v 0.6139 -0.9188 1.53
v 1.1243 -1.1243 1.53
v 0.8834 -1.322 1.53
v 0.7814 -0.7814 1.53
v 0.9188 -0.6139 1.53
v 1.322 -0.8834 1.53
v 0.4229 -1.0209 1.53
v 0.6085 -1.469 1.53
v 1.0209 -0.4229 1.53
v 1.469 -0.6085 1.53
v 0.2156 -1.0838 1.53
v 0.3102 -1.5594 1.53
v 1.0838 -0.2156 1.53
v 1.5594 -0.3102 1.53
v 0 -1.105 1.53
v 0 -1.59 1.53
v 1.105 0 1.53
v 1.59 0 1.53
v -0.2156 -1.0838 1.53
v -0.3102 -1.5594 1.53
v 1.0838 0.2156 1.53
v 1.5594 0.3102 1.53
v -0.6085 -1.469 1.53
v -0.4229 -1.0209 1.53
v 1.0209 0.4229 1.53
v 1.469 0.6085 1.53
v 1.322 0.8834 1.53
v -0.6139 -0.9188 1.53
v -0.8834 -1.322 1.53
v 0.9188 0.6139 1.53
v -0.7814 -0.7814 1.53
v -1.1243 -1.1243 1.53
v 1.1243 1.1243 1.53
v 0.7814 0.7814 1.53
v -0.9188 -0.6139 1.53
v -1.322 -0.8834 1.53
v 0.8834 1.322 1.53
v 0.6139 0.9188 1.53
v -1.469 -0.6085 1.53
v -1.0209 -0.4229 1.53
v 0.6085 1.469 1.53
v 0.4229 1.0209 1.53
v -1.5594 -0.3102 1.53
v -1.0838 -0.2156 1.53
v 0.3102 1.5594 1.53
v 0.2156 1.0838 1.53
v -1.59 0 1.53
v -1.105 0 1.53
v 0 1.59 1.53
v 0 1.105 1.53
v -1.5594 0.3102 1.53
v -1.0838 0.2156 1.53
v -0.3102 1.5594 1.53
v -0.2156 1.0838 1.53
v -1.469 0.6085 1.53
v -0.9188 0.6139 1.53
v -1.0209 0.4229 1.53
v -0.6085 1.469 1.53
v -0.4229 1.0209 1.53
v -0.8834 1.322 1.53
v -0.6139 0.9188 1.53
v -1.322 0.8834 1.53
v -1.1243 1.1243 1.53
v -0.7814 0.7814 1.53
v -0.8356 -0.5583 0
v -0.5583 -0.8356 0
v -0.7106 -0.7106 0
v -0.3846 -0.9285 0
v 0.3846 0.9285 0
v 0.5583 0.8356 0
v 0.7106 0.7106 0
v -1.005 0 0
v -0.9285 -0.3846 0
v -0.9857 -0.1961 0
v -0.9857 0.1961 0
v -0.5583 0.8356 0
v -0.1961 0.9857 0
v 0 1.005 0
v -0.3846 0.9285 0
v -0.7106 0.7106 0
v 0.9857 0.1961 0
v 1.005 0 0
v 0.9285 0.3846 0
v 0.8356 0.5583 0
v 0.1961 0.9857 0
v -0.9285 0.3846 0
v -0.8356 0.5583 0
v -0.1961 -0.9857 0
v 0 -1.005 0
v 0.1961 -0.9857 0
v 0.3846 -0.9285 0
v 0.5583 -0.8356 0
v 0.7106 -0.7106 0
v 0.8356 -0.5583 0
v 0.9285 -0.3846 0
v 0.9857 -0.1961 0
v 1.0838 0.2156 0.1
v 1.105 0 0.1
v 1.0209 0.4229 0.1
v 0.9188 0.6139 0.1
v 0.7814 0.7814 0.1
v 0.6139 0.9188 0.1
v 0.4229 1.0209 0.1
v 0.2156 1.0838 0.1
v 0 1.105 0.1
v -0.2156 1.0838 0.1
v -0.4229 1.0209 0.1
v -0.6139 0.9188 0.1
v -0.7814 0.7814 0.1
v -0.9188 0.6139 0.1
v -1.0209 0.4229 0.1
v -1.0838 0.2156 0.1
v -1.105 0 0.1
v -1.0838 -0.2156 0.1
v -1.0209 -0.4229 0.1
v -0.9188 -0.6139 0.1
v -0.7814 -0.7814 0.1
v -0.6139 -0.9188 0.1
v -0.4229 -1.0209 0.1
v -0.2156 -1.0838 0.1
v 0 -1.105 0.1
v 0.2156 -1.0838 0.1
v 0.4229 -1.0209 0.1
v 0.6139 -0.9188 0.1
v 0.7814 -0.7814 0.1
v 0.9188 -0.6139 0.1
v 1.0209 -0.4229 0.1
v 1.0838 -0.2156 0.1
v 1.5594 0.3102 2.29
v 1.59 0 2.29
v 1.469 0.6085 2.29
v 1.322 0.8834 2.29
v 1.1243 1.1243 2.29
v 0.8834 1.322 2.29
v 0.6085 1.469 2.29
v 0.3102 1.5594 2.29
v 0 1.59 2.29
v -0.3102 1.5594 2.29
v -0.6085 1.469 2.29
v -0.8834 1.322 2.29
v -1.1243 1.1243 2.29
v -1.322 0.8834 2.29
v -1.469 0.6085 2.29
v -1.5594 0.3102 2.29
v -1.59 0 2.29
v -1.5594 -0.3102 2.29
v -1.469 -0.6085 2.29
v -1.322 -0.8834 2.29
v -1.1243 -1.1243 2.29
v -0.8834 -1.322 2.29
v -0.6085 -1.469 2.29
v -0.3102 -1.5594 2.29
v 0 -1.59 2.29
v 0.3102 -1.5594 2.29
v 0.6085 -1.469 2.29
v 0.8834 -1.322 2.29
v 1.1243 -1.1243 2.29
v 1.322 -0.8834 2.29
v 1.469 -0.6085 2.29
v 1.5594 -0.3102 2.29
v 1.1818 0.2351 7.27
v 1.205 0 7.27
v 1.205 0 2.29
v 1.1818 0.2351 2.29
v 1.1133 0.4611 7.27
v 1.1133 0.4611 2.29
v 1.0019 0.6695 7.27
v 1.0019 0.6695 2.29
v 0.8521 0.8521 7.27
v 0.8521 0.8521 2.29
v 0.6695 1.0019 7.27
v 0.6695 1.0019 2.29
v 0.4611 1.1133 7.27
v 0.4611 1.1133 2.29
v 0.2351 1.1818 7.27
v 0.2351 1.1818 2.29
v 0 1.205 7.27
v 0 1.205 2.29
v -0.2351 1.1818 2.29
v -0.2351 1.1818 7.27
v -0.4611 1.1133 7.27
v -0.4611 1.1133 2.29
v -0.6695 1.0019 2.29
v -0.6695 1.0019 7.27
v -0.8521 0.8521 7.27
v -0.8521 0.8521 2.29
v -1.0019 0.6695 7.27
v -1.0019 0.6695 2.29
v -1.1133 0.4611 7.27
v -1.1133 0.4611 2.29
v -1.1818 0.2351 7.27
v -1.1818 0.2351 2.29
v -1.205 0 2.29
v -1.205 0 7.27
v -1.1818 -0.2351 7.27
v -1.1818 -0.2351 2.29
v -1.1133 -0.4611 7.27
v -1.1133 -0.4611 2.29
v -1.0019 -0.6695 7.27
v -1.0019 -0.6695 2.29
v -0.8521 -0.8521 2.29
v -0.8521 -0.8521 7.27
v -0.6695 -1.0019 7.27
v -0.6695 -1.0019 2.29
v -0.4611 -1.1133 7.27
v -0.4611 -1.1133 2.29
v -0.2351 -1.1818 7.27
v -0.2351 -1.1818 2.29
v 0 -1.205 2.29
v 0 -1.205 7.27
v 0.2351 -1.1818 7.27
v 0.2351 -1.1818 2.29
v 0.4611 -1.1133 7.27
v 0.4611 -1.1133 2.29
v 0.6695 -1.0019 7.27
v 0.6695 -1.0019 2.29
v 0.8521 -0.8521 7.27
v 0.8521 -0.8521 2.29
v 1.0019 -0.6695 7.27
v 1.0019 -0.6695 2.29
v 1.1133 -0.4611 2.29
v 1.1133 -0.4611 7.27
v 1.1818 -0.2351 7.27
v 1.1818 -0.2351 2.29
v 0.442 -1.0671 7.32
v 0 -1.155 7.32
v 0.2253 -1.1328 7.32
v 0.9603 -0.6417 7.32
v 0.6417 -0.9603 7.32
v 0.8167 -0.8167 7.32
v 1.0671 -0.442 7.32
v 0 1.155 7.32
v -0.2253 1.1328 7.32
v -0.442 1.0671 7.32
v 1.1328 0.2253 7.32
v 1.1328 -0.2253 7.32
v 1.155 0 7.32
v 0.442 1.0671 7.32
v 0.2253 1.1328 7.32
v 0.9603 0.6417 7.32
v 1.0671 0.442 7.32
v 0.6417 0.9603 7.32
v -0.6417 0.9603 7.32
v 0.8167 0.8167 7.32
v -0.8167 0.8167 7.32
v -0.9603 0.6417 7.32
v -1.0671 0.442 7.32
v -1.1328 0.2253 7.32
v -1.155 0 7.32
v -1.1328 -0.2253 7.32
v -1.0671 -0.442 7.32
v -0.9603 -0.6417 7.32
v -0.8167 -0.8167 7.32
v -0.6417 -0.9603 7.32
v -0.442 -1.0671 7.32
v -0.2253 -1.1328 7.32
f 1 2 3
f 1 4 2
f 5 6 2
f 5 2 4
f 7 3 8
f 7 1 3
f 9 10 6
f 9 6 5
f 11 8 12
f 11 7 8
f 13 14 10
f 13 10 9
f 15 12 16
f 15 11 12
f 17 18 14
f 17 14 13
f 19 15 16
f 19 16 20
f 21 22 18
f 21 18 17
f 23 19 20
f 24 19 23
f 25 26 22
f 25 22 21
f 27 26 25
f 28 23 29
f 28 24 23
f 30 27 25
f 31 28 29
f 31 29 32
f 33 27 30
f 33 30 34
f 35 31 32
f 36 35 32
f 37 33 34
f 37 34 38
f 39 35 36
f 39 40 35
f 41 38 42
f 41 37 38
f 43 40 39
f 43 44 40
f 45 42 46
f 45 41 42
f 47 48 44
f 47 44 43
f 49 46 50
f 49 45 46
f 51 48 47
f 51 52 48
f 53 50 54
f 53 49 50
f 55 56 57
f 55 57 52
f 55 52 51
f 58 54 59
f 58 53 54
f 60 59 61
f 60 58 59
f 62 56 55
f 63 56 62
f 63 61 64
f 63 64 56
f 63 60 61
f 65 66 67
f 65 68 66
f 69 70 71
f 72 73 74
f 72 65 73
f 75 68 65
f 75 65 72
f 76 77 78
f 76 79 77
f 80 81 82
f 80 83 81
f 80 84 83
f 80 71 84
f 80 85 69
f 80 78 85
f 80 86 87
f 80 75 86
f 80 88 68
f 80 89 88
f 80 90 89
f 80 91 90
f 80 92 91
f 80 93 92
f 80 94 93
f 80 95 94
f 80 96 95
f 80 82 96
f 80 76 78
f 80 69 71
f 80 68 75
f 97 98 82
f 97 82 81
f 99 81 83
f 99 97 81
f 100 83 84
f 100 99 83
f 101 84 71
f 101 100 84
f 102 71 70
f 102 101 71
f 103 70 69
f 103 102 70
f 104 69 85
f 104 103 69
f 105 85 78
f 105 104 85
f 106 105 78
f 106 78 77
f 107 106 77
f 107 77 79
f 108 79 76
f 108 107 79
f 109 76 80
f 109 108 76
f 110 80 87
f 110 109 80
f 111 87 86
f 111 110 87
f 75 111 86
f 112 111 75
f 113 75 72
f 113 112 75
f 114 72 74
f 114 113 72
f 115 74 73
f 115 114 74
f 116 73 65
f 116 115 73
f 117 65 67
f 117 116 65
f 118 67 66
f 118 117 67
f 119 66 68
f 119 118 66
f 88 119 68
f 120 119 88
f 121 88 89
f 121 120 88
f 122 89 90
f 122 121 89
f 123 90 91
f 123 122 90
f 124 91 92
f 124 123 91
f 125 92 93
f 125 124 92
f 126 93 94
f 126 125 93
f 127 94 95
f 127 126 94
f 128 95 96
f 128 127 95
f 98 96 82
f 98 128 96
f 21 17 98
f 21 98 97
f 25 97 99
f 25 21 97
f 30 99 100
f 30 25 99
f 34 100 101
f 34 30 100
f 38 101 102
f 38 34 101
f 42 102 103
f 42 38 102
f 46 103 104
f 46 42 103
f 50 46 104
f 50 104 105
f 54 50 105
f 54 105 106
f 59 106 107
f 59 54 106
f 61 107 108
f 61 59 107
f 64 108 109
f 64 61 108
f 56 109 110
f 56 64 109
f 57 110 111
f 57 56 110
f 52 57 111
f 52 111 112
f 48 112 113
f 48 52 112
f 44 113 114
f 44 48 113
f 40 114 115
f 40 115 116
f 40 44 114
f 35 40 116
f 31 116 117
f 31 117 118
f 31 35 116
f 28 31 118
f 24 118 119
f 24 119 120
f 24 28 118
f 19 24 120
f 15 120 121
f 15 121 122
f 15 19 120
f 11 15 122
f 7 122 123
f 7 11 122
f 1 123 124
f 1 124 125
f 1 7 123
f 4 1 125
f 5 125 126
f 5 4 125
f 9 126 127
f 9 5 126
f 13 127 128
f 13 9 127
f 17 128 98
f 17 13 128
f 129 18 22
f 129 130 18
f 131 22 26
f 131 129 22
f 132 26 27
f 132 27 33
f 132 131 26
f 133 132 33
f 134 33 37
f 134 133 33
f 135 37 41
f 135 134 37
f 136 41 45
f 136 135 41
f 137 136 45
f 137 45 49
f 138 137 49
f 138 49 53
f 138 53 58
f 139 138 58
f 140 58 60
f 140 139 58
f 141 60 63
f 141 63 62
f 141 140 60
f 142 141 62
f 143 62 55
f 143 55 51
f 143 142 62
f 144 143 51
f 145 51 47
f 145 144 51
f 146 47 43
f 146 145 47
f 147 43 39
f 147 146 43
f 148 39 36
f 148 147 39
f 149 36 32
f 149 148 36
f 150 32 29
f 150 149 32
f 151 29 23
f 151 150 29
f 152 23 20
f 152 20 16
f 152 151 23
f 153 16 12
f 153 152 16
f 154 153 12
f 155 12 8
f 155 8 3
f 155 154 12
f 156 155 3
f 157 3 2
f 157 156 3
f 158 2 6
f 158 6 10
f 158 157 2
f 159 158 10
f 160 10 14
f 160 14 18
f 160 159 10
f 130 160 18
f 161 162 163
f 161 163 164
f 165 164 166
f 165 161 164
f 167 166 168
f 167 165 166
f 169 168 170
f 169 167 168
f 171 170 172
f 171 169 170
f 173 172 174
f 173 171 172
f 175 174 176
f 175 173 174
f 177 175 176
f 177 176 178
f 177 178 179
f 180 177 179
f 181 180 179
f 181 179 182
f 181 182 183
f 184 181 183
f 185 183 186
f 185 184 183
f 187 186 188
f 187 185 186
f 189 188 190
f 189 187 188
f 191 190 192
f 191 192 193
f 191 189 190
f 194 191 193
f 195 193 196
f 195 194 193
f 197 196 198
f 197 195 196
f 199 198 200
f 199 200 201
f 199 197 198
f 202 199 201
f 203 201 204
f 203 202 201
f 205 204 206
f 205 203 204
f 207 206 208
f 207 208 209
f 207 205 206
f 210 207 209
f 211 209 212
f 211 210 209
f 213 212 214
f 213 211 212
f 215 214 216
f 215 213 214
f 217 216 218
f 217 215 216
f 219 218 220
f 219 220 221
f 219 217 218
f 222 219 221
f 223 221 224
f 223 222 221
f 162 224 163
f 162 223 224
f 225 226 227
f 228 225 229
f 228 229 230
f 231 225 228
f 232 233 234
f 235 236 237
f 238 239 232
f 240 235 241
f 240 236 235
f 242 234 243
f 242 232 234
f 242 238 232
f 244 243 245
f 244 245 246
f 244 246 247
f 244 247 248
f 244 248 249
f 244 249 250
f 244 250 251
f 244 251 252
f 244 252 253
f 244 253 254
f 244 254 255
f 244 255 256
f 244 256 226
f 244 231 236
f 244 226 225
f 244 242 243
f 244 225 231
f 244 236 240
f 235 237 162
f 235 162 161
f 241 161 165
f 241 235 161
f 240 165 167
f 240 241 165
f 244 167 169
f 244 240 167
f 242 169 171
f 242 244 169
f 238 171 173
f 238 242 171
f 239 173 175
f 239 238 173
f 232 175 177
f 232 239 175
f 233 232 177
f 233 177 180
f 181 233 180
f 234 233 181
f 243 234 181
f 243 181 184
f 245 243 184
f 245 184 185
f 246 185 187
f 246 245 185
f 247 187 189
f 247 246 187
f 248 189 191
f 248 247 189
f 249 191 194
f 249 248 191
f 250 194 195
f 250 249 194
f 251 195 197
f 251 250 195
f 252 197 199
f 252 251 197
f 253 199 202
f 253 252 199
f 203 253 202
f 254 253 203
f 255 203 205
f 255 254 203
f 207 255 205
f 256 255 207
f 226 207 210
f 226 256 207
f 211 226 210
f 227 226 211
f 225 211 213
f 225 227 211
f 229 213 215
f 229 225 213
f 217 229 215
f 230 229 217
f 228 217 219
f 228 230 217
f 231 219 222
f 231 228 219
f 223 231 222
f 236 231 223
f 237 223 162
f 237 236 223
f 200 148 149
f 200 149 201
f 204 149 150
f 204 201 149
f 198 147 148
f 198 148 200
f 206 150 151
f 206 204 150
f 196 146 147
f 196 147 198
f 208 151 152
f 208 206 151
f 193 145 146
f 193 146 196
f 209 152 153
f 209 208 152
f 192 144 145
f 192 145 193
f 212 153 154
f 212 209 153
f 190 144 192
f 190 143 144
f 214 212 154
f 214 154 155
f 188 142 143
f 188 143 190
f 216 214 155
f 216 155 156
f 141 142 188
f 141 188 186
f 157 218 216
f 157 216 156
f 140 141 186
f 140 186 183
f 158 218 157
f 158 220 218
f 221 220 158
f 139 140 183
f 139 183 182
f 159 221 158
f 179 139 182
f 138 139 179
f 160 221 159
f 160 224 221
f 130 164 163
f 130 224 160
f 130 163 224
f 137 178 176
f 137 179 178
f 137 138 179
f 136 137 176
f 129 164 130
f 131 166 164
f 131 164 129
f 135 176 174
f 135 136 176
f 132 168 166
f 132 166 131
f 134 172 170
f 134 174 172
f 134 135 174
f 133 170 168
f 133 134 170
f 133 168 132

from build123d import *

# Parameters (mm, degrees)
CHAMFER_SIZE    = 0.1
CHAMFER001_SIZE = 0.05


with BuildPart() as part:
    # Sketch → Revolution (revolve)
    with BuildSketch(Plane.XZ):
        Polygon((0, 0), (1.105, 0), (1.105, 1.53), (1.59, 1.53), (1.59, 2.29), (1.205, 2.29), (1.205, 7.32), (0, 7.32), align=None)
    revolve(axis=Axis((0, 0, 0), (0, 0, 1)))

    # Chamfer
    chamfer_edges = [part.edges().sort_by_distance(p)[0] for p in [
        (-1.105, 0, 0),
    ]]
    chamfer(chamfer_edges, length=CHAMFER_SIZE)

    # Chamfer001
    chamfer001_edges = [part.edges().sort_by_distance(p)[0] for p in [
        (-1.205, 0, 7.32),
    ]]
    chamfer(chamfer001_edges, length=CHAMFER001_SIZE)


solid = part.part
